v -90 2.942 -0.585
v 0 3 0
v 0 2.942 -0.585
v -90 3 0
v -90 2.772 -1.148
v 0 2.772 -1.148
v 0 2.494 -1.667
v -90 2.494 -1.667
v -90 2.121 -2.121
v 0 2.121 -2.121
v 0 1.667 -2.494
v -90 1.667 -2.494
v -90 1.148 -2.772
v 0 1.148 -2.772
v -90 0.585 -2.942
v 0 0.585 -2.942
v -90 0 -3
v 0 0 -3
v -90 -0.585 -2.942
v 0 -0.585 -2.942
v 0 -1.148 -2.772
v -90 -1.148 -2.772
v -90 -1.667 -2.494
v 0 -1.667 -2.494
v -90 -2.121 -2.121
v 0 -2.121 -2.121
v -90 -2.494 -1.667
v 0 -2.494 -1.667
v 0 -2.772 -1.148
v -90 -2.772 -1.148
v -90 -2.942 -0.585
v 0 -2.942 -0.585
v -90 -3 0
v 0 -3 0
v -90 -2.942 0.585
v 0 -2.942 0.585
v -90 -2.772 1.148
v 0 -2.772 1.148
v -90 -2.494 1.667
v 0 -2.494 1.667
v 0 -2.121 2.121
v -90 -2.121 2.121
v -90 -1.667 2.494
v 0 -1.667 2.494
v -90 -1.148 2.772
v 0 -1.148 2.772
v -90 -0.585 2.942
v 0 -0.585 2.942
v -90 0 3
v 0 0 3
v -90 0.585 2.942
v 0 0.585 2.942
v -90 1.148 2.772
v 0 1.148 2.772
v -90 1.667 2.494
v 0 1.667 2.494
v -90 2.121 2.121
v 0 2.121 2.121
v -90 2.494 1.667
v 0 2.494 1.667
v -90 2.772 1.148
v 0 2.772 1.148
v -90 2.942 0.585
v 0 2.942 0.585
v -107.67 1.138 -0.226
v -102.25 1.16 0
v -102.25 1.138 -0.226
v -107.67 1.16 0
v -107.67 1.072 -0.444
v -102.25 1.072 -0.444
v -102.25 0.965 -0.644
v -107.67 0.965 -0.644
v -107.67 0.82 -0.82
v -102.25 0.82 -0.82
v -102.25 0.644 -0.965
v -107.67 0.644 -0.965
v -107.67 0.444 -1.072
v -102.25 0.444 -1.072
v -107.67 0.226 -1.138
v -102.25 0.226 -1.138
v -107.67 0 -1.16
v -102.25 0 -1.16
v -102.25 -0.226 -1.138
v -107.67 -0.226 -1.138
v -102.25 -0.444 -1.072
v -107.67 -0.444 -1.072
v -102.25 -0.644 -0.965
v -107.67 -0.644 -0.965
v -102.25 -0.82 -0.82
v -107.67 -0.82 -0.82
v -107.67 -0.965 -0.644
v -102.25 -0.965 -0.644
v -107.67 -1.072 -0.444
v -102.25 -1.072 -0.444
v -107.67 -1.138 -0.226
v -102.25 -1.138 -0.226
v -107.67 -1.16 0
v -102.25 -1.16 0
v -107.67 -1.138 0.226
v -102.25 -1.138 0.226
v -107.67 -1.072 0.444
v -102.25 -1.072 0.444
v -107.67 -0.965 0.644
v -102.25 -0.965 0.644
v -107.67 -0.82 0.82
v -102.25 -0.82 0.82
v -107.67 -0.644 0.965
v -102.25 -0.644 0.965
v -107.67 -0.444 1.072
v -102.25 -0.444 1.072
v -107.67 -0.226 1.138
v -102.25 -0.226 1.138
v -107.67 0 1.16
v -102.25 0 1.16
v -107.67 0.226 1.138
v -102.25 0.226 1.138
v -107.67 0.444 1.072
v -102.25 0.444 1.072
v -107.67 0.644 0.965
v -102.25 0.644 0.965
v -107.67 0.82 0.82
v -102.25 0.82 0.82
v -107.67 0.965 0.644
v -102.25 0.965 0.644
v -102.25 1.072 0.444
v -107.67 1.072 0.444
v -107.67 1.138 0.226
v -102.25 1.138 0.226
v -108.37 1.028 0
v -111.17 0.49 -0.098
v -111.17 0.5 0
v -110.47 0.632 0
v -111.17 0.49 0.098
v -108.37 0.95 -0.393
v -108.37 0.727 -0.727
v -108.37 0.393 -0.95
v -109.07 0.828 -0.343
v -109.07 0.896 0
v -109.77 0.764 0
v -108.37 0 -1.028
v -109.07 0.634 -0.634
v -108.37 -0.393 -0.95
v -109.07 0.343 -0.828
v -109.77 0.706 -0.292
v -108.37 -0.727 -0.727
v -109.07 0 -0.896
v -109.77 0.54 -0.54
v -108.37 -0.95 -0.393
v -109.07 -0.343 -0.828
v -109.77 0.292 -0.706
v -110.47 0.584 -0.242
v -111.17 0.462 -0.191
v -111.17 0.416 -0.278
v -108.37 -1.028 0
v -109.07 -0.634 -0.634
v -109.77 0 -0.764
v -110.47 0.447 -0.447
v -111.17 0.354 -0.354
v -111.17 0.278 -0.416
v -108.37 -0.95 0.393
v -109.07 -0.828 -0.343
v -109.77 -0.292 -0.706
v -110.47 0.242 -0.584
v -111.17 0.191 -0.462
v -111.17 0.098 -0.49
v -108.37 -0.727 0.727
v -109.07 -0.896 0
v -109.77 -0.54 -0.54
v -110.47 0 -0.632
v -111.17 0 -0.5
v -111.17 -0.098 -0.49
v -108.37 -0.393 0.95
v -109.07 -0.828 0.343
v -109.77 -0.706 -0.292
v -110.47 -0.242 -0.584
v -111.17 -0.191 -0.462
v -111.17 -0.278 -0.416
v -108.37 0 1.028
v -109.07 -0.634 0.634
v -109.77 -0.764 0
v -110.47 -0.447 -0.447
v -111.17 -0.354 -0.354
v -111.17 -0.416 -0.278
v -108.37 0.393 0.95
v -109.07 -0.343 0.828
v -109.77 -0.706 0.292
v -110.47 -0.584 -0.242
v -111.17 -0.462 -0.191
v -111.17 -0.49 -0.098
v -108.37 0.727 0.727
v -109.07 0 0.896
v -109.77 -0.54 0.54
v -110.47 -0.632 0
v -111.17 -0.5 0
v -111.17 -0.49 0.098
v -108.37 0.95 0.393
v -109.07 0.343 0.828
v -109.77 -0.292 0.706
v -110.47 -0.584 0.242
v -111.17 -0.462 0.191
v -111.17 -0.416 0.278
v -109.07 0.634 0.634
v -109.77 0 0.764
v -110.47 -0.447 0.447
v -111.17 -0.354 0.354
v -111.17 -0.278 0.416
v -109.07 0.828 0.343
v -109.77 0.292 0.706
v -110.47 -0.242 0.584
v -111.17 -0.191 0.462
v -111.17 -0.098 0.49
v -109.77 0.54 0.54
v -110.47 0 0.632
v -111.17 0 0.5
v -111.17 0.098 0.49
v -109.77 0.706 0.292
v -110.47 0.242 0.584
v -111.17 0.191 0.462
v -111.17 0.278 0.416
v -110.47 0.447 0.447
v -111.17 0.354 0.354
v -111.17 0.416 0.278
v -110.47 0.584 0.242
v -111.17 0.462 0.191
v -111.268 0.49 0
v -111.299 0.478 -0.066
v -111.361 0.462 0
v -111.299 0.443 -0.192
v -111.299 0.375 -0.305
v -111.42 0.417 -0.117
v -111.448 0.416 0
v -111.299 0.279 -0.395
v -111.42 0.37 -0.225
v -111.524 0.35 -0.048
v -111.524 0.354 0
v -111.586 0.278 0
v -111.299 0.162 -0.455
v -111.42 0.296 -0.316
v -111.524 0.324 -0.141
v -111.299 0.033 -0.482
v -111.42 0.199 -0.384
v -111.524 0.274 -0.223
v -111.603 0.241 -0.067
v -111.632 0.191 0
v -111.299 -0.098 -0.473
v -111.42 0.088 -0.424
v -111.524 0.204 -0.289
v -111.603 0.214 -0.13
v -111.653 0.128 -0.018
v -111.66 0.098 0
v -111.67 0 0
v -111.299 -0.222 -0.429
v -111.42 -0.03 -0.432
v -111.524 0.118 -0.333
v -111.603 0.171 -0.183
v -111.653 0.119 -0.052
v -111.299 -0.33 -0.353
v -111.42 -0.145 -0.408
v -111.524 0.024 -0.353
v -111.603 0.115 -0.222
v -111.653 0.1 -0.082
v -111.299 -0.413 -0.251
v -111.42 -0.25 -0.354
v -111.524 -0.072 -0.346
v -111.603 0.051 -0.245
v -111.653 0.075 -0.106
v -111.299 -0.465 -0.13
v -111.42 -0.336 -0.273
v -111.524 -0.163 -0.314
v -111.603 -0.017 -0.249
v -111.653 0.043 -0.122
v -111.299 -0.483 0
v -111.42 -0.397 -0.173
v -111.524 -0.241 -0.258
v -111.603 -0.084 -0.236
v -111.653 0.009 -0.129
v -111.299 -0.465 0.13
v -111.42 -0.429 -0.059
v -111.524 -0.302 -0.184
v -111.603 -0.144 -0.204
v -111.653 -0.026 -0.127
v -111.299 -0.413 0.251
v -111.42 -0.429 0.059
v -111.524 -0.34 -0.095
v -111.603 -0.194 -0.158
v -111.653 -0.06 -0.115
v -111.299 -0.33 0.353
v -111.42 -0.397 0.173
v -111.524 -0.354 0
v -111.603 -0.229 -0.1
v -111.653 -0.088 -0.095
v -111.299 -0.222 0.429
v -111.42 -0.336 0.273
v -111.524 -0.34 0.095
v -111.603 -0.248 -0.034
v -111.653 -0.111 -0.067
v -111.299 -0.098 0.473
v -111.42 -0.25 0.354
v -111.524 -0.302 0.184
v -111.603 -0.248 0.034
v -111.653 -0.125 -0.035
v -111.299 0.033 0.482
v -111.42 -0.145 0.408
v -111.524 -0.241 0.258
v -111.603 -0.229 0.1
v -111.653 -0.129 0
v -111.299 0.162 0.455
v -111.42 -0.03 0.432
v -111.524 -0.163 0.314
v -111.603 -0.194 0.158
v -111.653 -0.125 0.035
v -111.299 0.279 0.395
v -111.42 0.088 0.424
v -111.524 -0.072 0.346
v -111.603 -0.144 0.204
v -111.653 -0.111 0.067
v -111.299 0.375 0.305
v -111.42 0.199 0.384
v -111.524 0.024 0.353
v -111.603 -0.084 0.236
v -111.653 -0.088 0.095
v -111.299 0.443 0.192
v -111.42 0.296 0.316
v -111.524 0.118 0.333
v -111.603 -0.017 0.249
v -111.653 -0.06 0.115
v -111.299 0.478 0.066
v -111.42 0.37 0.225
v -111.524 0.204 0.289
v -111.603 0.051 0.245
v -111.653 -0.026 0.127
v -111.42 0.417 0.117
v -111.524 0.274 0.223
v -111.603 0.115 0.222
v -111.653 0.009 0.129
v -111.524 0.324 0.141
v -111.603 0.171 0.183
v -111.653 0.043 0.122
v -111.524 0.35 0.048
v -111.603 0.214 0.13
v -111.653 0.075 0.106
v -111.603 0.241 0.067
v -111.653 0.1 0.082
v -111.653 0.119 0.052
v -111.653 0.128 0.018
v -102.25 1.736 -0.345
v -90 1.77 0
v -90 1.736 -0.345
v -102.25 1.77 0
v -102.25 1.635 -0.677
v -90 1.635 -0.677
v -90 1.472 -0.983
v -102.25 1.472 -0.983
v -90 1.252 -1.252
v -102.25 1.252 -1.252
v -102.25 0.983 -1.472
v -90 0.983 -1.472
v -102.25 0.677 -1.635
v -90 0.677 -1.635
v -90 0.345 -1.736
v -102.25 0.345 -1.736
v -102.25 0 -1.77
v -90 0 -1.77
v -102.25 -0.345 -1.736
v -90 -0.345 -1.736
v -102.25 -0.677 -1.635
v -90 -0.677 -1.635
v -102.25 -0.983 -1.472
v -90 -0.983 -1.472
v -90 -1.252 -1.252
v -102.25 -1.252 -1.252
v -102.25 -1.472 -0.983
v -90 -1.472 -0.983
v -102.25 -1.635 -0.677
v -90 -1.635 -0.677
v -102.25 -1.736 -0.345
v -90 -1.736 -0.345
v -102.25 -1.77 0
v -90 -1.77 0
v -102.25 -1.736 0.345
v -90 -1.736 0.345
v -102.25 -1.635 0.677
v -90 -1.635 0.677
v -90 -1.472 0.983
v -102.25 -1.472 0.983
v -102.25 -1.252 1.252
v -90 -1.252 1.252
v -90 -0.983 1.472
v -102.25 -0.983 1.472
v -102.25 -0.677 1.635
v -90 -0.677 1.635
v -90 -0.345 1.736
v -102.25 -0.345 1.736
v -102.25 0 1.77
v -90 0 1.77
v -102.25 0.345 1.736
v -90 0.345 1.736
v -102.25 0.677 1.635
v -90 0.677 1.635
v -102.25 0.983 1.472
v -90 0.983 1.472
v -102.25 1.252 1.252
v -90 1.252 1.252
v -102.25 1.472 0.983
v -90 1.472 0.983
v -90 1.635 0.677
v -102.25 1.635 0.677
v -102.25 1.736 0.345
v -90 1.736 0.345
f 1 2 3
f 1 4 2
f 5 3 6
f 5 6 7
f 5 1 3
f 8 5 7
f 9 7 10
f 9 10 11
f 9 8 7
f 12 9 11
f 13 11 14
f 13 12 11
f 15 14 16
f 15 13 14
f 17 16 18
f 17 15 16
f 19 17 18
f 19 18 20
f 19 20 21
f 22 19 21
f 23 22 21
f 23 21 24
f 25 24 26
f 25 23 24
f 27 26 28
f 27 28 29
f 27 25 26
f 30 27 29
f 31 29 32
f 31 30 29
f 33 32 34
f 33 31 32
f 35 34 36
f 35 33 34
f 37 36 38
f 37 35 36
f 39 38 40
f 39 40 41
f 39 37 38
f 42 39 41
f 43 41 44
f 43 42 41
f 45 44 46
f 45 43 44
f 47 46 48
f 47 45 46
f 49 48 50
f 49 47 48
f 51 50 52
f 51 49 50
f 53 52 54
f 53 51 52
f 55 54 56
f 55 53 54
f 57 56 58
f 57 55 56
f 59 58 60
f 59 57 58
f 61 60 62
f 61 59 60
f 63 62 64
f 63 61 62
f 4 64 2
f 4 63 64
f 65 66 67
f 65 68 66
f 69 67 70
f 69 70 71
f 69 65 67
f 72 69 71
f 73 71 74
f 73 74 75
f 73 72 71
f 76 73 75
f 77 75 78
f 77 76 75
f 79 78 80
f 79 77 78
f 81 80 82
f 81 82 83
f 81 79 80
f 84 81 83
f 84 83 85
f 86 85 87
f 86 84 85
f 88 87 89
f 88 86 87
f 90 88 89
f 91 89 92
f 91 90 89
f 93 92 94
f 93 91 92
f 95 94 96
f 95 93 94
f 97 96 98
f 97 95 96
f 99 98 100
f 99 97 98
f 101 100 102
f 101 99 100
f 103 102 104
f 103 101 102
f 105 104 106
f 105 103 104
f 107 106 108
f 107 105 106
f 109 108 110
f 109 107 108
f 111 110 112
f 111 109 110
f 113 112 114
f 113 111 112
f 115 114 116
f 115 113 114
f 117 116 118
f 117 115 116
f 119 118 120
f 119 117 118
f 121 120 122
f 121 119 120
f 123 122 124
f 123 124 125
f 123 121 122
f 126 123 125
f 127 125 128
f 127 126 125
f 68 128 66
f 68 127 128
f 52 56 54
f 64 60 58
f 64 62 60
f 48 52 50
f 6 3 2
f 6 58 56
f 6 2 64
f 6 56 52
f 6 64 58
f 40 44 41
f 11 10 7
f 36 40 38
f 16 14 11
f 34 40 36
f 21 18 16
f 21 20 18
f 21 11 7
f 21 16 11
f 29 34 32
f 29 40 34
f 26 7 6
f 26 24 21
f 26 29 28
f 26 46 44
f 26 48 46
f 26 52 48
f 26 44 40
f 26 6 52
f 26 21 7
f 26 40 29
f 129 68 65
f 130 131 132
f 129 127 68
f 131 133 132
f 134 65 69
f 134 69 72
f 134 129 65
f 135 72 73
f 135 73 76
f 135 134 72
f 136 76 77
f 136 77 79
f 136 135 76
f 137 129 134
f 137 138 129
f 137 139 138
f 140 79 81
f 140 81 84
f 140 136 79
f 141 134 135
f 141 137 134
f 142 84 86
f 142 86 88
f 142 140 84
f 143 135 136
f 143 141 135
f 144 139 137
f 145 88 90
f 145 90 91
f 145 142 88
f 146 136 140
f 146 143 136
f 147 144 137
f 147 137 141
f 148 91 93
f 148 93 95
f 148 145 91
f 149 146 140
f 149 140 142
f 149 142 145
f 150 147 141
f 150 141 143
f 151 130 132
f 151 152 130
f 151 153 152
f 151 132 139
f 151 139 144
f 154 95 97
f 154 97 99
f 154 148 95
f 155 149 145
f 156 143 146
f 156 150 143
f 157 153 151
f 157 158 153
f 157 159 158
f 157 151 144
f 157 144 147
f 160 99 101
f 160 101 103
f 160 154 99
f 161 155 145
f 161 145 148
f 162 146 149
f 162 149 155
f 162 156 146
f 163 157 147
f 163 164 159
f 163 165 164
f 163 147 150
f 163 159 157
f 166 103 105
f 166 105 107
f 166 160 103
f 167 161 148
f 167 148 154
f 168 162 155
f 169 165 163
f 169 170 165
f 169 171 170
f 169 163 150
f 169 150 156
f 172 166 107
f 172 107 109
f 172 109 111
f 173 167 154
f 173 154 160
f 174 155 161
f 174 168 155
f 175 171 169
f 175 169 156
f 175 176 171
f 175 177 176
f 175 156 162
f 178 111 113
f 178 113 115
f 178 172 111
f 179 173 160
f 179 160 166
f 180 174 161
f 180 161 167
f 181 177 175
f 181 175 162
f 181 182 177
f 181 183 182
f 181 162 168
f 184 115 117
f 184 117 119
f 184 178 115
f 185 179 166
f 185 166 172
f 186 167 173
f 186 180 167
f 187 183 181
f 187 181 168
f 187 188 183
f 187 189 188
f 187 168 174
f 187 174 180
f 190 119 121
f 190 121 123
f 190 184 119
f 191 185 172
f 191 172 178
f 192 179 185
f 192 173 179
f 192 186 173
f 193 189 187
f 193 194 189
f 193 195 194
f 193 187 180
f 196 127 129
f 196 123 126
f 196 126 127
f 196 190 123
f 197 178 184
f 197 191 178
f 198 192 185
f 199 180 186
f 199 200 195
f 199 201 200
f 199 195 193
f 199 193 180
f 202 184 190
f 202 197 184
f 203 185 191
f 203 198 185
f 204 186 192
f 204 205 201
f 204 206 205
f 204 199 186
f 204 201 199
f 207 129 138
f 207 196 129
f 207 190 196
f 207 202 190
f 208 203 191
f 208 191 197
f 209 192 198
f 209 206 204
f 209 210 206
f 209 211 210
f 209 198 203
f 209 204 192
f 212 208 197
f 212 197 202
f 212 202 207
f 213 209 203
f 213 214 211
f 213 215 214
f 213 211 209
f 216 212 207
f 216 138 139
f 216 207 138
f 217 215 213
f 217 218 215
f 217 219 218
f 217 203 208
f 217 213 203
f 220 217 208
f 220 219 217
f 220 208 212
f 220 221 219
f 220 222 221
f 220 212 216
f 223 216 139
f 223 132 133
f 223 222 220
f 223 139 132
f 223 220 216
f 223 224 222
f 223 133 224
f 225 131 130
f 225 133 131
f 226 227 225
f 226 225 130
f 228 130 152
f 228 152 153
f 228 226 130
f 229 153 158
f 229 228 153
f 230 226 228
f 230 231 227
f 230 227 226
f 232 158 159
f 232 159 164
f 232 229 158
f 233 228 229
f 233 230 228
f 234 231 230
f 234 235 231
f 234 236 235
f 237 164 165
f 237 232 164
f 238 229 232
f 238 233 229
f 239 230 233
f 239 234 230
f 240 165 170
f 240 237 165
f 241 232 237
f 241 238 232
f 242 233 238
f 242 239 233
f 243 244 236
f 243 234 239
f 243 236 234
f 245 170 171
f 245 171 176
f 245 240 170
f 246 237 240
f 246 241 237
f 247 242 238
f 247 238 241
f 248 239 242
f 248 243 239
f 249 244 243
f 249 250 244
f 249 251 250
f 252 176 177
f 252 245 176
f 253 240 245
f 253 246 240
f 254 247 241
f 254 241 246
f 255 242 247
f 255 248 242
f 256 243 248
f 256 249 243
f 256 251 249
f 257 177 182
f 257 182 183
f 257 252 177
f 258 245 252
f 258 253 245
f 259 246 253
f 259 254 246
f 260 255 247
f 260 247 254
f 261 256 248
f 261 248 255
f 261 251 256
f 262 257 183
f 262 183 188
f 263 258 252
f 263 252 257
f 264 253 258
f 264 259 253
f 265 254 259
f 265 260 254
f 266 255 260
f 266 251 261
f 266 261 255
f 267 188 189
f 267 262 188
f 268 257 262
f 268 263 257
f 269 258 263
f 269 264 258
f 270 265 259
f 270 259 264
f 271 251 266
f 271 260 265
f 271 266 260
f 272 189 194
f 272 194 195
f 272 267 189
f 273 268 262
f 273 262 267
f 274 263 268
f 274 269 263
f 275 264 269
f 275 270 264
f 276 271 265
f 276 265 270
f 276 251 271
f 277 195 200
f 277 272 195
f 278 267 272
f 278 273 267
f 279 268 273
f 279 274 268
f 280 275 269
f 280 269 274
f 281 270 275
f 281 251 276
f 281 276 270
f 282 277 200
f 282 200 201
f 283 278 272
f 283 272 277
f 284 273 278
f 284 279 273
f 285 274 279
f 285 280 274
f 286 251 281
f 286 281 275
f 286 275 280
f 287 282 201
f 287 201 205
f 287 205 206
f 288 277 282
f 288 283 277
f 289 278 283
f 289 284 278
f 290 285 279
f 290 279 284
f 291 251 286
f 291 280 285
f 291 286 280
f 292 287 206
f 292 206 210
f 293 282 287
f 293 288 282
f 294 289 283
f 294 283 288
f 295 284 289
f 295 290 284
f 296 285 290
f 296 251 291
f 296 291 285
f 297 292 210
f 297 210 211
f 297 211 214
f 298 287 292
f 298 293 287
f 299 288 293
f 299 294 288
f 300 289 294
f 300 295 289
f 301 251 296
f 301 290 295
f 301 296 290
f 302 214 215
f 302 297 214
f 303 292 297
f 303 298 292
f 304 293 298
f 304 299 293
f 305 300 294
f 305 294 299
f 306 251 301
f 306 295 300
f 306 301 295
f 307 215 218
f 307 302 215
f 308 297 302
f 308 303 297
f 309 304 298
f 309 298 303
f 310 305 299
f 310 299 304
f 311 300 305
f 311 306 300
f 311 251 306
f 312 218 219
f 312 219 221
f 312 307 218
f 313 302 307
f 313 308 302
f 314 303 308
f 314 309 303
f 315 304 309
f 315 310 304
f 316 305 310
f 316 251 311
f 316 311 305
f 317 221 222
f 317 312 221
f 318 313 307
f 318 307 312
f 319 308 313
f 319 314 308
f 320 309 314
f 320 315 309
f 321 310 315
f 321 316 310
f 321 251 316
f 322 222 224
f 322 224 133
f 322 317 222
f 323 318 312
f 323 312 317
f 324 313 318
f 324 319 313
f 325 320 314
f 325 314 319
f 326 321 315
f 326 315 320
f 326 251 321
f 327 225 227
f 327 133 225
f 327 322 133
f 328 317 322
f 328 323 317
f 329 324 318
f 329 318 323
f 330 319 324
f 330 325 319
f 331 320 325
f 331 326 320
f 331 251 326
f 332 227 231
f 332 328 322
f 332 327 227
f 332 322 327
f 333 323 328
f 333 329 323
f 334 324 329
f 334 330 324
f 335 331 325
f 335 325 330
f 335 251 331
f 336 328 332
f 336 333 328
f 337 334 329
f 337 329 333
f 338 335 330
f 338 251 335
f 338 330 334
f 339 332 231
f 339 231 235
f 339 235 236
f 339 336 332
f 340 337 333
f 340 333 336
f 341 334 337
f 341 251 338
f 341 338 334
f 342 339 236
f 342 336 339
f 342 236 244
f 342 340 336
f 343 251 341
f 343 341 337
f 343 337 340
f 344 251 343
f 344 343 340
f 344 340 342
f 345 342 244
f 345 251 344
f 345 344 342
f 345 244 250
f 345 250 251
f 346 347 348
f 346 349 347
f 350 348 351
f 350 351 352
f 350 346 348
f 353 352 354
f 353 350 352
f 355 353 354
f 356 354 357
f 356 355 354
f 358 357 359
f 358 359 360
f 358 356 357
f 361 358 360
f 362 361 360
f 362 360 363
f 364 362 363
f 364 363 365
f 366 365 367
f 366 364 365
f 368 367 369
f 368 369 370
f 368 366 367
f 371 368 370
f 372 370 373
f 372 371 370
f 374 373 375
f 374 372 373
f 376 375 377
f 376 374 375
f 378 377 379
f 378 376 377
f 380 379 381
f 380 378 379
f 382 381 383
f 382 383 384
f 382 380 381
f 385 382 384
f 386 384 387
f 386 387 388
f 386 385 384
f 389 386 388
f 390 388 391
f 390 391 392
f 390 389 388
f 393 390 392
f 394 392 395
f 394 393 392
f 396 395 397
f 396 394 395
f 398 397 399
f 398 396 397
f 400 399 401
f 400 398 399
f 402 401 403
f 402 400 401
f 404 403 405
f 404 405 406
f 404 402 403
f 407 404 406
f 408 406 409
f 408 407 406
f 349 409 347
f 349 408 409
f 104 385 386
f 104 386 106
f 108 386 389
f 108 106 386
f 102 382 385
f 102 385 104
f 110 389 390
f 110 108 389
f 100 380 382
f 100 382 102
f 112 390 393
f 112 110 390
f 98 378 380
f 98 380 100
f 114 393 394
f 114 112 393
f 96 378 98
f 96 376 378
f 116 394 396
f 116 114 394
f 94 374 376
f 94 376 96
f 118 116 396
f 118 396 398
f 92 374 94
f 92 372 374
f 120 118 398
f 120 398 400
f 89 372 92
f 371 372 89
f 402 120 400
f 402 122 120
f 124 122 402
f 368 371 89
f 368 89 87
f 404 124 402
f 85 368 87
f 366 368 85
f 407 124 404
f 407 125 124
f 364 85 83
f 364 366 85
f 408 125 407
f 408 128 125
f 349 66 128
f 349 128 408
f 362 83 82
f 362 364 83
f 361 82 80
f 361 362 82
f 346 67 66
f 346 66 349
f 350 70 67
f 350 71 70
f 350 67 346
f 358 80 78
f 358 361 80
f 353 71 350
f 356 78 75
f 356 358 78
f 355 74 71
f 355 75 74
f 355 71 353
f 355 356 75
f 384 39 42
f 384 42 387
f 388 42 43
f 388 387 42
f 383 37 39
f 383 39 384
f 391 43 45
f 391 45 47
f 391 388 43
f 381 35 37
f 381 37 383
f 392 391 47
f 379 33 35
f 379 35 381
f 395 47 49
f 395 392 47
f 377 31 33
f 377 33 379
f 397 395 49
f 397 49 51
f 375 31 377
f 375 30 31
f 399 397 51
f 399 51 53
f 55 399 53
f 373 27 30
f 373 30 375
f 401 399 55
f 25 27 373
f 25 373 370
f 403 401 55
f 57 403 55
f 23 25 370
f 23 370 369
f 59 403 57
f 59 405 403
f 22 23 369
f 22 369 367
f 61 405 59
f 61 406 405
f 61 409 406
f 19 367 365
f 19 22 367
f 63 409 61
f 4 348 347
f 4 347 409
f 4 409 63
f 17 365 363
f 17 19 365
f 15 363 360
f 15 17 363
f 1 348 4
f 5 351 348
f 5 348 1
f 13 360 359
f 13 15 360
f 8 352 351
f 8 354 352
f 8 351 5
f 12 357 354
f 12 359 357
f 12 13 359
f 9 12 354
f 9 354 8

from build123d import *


with BuildPart() as part:
    # Sketch1 → Revolve1 (revolve)
    with BuildSketch(Plane.XY):
        with BuildLine():
            Line((-90, 3), (-90, 1.77))
            Line((-90, 1.77), (-102.25, 1.77))
            Line((-102.25, 1.77), (-102.25, 1.16))
            Line((-102.25, 1.16), (-107.67, 1.16))
            Line((-107.67, 1.16), (-111.17, 0.5))
            ThreePointArc((-111.17, 0.5), (-111.523553391, 0.353553391), (-111.67, 0))
            Line((-111.67, 0), (0, 0))
            Line((0, 0), (0, 3))
            Line((0, 3), (-90, 3))
        make_face()
    revolve(axis=Axis((0, 0, 0), (-1, 0, 0)))


solid = part.part
